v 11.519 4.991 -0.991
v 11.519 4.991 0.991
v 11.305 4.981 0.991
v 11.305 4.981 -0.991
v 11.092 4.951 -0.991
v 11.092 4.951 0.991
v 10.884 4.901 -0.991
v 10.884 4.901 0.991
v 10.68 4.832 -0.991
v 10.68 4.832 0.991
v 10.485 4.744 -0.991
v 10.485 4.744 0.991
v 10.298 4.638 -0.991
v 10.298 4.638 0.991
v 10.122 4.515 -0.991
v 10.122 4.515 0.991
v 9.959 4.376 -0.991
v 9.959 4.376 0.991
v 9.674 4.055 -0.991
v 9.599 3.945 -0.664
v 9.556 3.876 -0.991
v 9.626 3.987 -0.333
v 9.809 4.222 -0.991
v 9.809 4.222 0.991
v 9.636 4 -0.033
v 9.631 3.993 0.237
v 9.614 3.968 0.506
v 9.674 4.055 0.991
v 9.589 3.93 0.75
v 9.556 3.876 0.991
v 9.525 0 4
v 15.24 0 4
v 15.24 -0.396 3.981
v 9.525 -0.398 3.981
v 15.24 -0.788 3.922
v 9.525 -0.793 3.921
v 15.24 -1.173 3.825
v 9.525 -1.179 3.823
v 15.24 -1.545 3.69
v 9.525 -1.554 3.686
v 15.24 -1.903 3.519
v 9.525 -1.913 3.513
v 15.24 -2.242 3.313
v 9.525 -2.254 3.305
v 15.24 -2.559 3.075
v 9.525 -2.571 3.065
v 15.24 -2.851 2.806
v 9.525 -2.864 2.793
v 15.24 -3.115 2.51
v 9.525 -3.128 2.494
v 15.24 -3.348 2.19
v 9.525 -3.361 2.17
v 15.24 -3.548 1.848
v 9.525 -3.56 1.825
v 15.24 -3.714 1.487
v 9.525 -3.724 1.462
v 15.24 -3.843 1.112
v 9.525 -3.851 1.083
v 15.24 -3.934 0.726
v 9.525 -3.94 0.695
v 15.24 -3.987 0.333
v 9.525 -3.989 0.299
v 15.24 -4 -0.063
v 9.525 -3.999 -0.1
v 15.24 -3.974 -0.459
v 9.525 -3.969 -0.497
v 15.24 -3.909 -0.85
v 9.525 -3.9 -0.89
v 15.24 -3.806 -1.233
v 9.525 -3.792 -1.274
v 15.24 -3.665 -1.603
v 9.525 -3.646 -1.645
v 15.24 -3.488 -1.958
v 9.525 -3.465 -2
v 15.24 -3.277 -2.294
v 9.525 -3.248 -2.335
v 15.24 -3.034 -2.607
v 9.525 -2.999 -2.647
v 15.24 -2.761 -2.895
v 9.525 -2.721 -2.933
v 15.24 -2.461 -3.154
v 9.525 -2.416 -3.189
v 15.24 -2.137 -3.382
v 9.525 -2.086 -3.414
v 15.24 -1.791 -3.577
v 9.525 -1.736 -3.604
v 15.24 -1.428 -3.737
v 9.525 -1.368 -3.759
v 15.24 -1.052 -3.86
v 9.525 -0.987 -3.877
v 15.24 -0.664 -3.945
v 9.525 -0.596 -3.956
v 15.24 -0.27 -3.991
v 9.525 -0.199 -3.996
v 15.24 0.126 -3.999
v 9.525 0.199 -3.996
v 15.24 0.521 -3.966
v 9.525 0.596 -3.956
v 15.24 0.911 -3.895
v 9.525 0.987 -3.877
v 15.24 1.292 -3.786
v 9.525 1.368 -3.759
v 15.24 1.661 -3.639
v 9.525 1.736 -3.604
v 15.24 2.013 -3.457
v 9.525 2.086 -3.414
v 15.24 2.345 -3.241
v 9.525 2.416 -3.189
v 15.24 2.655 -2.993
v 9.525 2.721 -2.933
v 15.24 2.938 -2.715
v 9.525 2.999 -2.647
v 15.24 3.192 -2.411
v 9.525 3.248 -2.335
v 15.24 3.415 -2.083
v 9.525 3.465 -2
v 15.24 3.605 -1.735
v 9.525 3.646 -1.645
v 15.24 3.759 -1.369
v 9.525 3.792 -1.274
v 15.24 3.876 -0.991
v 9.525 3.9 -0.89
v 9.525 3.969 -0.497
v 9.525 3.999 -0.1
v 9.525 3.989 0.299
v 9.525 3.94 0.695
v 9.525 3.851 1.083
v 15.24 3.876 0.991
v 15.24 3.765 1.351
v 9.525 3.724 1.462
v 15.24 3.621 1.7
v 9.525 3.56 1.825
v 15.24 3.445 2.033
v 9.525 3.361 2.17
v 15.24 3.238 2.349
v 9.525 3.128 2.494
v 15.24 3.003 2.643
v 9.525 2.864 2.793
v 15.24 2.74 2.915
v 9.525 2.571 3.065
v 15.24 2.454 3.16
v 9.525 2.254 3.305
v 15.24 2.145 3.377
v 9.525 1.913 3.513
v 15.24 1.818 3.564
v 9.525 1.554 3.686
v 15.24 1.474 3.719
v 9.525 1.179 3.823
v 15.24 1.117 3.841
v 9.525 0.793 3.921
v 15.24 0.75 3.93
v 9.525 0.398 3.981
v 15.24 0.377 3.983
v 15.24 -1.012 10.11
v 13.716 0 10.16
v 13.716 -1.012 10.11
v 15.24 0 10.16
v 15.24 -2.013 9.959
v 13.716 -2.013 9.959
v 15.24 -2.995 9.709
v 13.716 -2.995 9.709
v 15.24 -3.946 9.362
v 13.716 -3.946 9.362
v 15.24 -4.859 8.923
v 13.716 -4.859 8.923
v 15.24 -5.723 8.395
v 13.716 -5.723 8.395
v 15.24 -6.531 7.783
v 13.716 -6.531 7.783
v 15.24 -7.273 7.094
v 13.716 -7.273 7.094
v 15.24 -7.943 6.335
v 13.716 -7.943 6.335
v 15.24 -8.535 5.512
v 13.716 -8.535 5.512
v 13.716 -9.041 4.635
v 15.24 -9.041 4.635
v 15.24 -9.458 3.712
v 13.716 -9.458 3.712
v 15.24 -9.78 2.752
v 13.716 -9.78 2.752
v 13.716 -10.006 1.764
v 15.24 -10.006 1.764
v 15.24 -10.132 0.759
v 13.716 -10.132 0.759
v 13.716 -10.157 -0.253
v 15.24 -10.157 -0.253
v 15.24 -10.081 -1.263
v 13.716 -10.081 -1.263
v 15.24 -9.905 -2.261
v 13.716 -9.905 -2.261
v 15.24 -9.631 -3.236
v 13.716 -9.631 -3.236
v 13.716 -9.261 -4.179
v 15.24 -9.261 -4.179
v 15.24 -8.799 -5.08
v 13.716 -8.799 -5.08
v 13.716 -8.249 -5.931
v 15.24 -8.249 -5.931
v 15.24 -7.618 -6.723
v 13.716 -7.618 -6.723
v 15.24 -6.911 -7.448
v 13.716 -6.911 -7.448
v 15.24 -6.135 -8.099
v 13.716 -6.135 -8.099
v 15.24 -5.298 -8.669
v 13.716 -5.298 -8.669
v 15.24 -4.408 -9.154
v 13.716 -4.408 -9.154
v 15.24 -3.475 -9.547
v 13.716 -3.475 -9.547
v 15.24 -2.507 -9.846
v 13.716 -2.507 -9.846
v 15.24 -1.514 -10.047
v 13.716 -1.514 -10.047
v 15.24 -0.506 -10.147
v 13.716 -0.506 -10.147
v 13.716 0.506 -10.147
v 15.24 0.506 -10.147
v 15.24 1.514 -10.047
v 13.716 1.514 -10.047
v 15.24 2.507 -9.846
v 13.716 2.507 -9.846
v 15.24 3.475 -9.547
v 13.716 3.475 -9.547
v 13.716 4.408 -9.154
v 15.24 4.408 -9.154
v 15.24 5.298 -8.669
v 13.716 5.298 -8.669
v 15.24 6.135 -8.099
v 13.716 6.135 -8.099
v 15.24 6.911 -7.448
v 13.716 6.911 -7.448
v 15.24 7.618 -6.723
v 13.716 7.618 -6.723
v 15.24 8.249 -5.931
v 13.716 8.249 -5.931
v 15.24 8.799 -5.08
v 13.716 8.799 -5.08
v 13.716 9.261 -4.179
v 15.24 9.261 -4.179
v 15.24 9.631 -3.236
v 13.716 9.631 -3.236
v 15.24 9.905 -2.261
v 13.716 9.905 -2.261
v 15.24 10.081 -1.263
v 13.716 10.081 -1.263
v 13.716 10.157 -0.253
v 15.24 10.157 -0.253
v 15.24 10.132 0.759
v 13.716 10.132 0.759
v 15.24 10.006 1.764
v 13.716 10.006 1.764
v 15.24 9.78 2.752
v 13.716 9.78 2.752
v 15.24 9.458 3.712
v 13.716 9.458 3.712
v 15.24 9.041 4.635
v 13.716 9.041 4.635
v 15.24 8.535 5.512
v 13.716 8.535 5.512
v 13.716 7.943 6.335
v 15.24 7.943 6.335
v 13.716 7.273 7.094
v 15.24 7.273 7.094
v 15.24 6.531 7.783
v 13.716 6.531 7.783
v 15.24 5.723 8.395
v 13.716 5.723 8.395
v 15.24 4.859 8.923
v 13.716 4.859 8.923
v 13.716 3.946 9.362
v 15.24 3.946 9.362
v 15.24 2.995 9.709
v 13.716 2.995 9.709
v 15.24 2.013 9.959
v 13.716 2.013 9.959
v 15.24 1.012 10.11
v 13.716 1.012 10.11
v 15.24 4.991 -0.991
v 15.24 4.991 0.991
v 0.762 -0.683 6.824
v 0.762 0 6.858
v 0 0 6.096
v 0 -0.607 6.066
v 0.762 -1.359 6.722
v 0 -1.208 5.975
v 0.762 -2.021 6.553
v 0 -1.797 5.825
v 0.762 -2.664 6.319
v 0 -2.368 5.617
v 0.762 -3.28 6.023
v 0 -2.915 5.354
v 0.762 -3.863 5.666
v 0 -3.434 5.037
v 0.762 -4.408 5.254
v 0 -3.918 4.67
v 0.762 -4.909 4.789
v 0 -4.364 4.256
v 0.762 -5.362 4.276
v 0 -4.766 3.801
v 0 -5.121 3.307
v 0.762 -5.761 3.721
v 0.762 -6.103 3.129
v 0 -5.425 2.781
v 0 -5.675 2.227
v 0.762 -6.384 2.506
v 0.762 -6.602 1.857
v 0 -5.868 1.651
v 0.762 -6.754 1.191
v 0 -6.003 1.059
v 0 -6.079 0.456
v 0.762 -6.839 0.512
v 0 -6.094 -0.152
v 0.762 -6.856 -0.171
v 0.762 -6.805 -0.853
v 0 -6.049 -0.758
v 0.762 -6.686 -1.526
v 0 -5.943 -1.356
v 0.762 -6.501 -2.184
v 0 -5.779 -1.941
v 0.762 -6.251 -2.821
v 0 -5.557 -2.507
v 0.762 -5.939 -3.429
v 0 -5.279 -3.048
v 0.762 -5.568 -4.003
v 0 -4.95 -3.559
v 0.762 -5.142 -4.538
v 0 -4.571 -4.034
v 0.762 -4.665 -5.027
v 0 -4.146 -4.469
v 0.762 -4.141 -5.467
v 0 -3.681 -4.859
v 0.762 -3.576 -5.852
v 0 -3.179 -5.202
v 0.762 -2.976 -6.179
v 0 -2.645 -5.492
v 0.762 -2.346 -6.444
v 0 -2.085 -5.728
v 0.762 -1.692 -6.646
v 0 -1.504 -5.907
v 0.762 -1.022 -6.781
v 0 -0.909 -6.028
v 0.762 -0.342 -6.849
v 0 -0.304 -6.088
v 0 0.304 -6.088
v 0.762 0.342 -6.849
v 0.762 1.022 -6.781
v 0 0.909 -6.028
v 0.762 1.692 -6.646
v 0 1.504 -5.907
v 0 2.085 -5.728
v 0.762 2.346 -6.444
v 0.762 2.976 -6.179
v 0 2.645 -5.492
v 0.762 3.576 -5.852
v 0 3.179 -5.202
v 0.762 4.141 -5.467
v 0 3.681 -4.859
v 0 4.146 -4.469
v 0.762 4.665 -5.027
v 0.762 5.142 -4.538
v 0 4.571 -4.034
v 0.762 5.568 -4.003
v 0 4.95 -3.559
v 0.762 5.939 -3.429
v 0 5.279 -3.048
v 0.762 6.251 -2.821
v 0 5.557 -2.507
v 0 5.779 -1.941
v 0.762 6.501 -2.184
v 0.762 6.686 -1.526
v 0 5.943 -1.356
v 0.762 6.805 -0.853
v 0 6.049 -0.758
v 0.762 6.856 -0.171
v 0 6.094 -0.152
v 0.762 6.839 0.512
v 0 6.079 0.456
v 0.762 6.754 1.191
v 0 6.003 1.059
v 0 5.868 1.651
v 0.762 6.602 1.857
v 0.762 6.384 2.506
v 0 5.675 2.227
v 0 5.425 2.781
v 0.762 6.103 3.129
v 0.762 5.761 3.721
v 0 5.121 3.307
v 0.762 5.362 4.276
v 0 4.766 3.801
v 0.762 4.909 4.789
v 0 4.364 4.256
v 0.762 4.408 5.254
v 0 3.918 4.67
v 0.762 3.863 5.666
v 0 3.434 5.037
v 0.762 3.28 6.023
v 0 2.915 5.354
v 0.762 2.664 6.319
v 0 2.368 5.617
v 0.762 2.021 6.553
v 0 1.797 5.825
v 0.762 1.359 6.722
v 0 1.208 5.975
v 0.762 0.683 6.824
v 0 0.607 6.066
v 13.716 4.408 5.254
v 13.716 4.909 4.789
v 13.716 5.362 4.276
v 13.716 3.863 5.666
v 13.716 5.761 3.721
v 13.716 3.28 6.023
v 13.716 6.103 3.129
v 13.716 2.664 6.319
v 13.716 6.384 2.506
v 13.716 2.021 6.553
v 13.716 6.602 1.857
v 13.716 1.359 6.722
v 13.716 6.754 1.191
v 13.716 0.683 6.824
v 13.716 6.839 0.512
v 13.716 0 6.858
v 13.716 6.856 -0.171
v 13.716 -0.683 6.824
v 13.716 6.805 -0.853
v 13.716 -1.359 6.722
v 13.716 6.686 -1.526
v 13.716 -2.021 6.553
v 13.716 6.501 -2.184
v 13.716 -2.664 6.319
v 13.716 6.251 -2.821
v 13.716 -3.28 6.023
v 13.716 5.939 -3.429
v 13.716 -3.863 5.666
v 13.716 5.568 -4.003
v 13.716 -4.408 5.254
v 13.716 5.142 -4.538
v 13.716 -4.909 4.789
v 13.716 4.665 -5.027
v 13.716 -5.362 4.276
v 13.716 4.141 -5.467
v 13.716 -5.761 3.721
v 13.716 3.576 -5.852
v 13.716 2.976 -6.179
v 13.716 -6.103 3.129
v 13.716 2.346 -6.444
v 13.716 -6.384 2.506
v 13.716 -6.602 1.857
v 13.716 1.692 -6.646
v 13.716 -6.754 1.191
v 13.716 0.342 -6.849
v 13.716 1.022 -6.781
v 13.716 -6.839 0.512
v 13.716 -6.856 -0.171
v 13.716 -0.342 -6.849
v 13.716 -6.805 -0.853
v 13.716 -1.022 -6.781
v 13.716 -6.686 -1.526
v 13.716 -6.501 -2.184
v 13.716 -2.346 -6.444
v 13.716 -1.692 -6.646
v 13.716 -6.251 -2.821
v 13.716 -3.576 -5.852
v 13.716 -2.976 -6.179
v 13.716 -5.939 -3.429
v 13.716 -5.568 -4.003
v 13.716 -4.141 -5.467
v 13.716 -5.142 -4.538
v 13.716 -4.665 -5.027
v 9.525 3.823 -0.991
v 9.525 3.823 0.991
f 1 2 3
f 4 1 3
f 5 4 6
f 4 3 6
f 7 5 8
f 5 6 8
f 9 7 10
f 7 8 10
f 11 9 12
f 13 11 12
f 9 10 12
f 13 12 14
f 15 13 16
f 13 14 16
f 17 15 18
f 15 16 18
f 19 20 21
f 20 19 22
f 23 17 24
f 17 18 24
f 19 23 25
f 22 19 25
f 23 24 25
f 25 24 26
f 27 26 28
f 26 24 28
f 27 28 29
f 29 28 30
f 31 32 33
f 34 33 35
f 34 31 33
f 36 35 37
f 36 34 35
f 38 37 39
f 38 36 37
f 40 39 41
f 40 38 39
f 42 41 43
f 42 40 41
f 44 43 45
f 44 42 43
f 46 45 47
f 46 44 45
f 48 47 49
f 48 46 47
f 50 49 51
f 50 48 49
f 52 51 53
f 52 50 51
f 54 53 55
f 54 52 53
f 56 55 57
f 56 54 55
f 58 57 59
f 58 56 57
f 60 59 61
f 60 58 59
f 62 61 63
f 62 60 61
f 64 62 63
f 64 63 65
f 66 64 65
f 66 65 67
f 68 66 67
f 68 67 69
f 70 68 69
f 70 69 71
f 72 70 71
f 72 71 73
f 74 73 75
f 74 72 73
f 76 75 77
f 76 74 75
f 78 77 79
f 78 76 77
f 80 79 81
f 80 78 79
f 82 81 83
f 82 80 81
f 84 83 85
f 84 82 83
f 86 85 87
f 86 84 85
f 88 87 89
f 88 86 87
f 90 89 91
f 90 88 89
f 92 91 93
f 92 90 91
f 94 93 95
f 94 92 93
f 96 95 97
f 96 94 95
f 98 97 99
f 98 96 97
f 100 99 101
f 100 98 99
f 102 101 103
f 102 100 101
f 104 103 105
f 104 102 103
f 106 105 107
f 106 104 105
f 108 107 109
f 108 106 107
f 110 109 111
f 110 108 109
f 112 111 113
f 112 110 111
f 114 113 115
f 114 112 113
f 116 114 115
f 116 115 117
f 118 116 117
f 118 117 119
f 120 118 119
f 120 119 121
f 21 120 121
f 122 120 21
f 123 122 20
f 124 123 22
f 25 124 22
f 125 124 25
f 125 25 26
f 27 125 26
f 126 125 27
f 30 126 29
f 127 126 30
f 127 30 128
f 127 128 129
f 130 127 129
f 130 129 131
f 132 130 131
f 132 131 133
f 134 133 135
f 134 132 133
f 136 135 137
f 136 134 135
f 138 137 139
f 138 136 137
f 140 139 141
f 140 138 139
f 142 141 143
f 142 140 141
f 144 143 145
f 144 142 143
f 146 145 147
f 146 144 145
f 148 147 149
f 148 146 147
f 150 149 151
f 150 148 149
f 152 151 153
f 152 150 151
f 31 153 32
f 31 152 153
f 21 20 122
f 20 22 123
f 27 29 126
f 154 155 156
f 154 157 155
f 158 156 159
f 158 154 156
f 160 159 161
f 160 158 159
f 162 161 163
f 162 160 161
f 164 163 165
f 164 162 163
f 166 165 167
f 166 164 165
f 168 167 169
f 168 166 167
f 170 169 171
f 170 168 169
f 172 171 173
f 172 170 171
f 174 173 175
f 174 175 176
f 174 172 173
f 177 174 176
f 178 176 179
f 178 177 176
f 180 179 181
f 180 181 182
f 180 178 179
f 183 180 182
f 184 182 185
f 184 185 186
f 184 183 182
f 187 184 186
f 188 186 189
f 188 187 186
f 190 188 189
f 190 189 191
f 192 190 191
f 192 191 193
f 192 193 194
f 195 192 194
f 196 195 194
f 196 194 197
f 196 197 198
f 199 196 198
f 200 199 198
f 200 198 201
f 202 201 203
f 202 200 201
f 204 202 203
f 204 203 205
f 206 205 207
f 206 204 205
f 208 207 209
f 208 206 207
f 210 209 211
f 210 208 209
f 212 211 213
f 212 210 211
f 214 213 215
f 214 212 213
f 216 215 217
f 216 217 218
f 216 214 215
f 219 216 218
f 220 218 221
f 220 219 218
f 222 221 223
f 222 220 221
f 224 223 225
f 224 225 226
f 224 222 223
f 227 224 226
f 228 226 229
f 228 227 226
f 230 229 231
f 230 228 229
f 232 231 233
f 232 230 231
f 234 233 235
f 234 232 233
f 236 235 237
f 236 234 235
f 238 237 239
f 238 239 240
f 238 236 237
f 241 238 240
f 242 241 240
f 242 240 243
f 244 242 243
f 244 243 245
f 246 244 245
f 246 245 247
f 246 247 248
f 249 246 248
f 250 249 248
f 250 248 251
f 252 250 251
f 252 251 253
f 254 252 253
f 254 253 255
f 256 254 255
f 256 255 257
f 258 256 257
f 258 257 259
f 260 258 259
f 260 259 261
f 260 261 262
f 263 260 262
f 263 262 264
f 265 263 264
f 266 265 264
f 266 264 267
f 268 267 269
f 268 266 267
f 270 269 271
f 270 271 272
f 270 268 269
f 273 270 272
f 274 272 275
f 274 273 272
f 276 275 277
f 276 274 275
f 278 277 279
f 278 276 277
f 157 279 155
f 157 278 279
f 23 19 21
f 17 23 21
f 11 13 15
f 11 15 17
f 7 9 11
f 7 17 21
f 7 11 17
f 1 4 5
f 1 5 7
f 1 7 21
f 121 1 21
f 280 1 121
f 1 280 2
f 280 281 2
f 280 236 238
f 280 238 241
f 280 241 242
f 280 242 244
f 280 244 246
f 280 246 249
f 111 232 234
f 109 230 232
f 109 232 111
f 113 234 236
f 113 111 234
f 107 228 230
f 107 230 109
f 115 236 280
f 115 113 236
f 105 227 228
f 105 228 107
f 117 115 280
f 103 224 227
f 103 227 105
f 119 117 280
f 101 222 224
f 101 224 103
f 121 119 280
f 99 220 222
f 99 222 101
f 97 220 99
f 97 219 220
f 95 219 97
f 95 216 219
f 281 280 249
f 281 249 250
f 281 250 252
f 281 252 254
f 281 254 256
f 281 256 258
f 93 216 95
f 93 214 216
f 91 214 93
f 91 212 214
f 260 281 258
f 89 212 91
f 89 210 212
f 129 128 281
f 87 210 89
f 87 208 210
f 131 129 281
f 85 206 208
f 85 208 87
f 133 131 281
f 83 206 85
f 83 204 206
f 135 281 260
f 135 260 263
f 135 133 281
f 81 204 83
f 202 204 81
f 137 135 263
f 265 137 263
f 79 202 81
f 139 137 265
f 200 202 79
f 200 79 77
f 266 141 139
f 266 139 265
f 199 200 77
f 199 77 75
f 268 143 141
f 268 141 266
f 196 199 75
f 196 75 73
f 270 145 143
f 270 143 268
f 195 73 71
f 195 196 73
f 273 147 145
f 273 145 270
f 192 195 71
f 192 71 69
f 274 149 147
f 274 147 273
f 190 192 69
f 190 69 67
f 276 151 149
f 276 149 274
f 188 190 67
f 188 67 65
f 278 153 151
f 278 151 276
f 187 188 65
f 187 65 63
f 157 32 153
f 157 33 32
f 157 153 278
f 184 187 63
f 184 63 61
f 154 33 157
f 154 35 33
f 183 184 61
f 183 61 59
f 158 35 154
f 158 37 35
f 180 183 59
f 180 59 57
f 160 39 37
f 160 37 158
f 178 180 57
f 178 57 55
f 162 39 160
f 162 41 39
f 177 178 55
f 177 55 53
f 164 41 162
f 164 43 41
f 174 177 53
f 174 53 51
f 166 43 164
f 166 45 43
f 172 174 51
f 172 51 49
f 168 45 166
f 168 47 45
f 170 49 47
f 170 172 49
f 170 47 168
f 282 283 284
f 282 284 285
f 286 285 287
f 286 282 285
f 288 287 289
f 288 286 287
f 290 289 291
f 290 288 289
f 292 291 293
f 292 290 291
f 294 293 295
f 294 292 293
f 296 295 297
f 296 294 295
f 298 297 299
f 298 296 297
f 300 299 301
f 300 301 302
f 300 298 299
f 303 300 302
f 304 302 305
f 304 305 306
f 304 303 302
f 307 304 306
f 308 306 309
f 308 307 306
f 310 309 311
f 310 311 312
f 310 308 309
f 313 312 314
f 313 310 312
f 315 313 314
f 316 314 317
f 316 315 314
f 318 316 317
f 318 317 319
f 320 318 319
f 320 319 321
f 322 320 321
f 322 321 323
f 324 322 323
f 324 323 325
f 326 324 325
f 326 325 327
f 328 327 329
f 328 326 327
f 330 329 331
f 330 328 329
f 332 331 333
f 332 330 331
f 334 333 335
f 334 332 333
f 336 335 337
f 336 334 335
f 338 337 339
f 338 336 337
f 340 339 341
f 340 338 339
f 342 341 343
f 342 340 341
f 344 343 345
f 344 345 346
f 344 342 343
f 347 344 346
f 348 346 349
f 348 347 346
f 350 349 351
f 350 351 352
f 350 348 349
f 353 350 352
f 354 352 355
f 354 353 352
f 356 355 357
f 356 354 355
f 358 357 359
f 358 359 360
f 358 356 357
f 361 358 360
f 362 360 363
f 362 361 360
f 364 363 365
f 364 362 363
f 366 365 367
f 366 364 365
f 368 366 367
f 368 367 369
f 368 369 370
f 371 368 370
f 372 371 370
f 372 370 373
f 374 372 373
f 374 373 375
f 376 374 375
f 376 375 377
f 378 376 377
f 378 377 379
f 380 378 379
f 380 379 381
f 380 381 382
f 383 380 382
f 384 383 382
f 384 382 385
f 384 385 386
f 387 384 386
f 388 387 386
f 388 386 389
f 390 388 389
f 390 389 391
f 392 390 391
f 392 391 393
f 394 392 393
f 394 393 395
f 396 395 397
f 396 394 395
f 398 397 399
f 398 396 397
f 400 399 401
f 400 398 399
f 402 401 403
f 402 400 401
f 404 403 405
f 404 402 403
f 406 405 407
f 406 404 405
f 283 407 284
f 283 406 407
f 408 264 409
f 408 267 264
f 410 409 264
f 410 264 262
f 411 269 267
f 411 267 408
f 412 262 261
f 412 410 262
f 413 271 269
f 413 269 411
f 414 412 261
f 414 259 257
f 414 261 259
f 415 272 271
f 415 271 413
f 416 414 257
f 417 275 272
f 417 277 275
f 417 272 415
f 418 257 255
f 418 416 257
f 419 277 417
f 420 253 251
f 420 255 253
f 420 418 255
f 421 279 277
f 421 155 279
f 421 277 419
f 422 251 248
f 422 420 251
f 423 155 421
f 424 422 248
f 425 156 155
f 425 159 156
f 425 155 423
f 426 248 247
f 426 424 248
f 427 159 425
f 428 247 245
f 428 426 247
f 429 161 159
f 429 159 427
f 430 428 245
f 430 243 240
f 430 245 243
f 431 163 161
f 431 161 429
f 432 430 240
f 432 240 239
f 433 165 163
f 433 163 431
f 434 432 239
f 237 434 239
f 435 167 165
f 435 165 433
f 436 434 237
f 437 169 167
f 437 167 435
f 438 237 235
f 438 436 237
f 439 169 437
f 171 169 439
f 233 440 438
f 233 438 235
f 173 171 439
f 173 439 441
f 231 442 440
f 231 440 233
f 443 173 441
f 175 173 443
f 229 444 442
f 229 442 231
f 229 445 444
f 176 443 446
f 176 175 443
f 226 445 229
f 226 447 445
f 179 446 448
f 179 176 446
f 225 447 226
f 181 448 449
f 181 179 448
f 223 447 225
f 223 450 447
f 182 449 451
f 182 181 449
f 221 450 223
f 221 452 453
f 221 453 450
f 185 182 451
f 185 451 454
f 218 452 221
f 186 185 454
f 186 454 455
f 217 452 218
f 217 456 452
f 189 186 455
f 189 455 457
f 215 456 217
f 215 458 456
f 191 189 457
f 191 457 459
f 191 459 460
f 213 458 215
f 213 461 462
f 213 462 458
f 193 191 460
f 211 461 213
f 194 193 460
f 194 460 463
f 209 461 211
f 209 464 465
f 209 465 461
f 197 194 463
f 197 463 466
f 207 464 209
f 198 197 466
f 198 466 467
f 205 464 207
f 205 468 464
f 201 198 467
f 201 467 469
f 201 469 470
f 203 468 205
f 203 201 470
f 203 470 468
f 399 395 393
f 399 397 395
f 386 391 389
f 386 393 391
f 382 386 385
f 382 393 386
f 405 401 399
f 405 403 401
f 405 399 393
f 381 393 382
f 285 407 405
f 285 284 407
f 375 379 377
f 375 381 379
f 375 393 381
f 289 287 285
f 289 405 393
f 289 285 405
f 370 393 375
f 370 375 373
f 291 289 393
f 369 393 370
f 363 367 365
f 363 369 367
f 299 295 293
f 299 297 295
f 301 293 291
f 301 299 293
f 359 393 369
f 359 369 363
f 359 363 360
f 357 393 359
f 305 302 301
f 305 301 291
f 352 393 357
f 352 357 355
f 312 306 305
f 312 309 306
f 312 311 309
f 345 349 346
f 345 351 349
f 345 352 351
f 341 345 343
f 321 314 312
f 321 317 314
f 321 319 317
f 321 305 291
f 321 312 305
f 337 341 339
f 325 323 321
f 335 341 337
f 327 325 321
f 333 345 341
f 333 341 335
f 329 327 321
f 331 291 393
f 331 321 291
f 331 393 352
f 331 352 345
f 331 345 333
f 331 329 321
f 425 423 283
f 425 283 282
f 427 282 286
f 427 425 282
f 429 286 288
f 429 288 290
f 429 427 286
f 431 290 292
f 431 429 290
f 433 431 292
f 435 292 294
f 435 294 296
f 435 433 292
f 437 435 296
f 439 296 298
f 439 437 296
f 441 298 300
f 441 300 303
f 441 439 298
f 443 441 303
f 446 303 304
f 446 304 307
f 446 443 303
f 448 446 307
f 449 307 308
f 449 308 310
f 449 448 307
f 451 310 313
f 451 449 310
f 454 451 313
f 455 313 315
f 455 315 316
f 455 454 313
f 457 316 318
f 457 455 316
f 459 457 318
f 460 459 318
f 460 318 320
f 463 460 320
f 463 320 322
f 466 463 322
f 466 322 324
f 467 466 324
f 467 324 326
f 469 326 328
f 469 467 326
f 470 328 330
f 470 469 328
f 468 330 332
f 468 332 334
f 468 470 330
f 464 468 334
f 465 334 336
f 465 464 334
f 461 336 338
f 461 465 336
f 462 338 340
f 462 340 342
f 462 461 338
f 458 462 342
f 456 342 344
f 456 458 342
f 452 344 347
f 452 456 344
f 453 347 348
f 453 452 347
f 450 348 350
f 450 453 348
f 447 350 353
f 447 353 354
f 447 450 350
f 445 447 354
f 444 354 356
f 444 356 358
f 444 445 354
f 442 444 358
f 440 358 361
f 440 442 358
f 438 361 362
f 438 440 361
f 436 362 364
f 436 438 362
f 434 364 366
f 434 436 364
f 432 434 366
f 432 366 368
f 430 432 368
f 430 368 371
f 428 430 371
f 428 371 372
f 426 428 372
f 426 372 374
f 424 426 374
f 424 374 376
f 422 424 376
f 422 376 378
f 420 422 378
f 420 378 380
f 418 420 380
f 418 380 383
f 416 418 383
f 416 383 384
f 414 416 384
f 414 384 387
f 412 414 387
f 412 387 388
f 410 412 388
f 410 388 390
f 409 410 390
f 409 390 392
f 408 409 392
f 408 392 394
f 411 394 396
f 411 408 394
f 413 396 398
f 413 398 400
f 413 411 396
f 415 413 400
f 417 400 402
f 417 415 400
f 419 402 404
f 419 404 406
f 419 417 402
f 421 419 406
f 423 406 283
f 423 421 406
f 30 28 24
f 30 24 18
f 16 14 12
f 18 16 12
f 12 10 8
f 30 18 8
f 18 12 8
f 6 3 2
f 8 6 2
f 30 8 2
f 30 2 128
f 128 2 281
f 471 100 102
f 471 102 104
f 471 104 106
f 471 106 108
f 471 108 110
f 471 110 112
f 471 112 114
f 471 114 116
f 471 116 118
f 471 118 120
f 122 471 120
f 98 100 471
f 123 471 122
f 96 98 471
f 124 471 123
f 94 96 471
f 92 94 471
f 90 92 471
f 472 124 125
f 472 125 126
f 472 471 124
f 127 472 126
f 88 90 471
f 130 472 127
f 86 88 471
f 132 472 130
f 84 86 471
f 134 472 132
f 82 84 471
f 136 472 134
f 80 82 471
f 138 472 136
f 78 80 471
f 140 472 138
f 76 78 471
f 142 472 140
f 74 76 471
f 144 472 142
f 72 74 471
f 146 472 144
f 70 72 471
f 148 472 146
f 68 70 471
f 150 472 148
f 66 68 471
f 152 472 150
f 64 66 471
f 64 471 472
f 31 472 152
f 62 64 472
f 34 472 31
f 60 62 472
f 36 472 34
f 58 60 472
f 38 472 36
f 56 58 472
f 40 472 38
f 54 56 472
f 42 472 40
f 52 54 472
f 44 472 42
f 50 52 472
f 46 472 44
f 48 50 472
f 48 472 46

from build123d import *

# Parameters (mm, degrees)
CHAMFER1_SIZE  = 0.762
EXTRUDE1_DEPTH = 0.9906


with BuildPart() as part:
    # Sketch1 → Revolve1 (revolve)
    with BuildSketch(Plane.XY, mode=Mode.PRIVATE) as revolve1_sk:
        Polygon((0, 0), (0, 6.858), (13.716, 6.858), (13.716, 10.16), (15.24, 10.16), (15.24, 4.0005), (9.525, 4.0005), (9.525, 0), align=None)
    revolve(revolve1_sk.sketch.rotate(Axis((0, 0, 0), (1, 0, 0)), 90), axis=Axis((0, 0, 0), (1, 0, 0)))

    # Chamfer1
    chamfer1_edges = [part.edges().sort_by_distance(p)[0] for p in [
        (0, 0, -6.858),
    ]]
    chamfer(chamfer1_edges, length=CHAMFER1_SIZE)

    # Sketch3 → Extrude1 (cut, symmetric)
    with BuildSketch(Plane.XY):
        with BuildLine():
            Line((15.24, 4.9911), (11.519183101, 4.9911))
            ThreePointArc((11.519183101, 4.9911), (10.363552883, 4.677488096), (9.525, 3.8227))
            Line((9.525, 3.8227), (15.24, 3.8227))
            Line((15.24, 3.8227), (15.24, 4.9911))
        make_face()
    extrude(amount=EXTRUDE1_DEPTH, both=True, mode=Mode.SUBTRACT)


solid = part.part
